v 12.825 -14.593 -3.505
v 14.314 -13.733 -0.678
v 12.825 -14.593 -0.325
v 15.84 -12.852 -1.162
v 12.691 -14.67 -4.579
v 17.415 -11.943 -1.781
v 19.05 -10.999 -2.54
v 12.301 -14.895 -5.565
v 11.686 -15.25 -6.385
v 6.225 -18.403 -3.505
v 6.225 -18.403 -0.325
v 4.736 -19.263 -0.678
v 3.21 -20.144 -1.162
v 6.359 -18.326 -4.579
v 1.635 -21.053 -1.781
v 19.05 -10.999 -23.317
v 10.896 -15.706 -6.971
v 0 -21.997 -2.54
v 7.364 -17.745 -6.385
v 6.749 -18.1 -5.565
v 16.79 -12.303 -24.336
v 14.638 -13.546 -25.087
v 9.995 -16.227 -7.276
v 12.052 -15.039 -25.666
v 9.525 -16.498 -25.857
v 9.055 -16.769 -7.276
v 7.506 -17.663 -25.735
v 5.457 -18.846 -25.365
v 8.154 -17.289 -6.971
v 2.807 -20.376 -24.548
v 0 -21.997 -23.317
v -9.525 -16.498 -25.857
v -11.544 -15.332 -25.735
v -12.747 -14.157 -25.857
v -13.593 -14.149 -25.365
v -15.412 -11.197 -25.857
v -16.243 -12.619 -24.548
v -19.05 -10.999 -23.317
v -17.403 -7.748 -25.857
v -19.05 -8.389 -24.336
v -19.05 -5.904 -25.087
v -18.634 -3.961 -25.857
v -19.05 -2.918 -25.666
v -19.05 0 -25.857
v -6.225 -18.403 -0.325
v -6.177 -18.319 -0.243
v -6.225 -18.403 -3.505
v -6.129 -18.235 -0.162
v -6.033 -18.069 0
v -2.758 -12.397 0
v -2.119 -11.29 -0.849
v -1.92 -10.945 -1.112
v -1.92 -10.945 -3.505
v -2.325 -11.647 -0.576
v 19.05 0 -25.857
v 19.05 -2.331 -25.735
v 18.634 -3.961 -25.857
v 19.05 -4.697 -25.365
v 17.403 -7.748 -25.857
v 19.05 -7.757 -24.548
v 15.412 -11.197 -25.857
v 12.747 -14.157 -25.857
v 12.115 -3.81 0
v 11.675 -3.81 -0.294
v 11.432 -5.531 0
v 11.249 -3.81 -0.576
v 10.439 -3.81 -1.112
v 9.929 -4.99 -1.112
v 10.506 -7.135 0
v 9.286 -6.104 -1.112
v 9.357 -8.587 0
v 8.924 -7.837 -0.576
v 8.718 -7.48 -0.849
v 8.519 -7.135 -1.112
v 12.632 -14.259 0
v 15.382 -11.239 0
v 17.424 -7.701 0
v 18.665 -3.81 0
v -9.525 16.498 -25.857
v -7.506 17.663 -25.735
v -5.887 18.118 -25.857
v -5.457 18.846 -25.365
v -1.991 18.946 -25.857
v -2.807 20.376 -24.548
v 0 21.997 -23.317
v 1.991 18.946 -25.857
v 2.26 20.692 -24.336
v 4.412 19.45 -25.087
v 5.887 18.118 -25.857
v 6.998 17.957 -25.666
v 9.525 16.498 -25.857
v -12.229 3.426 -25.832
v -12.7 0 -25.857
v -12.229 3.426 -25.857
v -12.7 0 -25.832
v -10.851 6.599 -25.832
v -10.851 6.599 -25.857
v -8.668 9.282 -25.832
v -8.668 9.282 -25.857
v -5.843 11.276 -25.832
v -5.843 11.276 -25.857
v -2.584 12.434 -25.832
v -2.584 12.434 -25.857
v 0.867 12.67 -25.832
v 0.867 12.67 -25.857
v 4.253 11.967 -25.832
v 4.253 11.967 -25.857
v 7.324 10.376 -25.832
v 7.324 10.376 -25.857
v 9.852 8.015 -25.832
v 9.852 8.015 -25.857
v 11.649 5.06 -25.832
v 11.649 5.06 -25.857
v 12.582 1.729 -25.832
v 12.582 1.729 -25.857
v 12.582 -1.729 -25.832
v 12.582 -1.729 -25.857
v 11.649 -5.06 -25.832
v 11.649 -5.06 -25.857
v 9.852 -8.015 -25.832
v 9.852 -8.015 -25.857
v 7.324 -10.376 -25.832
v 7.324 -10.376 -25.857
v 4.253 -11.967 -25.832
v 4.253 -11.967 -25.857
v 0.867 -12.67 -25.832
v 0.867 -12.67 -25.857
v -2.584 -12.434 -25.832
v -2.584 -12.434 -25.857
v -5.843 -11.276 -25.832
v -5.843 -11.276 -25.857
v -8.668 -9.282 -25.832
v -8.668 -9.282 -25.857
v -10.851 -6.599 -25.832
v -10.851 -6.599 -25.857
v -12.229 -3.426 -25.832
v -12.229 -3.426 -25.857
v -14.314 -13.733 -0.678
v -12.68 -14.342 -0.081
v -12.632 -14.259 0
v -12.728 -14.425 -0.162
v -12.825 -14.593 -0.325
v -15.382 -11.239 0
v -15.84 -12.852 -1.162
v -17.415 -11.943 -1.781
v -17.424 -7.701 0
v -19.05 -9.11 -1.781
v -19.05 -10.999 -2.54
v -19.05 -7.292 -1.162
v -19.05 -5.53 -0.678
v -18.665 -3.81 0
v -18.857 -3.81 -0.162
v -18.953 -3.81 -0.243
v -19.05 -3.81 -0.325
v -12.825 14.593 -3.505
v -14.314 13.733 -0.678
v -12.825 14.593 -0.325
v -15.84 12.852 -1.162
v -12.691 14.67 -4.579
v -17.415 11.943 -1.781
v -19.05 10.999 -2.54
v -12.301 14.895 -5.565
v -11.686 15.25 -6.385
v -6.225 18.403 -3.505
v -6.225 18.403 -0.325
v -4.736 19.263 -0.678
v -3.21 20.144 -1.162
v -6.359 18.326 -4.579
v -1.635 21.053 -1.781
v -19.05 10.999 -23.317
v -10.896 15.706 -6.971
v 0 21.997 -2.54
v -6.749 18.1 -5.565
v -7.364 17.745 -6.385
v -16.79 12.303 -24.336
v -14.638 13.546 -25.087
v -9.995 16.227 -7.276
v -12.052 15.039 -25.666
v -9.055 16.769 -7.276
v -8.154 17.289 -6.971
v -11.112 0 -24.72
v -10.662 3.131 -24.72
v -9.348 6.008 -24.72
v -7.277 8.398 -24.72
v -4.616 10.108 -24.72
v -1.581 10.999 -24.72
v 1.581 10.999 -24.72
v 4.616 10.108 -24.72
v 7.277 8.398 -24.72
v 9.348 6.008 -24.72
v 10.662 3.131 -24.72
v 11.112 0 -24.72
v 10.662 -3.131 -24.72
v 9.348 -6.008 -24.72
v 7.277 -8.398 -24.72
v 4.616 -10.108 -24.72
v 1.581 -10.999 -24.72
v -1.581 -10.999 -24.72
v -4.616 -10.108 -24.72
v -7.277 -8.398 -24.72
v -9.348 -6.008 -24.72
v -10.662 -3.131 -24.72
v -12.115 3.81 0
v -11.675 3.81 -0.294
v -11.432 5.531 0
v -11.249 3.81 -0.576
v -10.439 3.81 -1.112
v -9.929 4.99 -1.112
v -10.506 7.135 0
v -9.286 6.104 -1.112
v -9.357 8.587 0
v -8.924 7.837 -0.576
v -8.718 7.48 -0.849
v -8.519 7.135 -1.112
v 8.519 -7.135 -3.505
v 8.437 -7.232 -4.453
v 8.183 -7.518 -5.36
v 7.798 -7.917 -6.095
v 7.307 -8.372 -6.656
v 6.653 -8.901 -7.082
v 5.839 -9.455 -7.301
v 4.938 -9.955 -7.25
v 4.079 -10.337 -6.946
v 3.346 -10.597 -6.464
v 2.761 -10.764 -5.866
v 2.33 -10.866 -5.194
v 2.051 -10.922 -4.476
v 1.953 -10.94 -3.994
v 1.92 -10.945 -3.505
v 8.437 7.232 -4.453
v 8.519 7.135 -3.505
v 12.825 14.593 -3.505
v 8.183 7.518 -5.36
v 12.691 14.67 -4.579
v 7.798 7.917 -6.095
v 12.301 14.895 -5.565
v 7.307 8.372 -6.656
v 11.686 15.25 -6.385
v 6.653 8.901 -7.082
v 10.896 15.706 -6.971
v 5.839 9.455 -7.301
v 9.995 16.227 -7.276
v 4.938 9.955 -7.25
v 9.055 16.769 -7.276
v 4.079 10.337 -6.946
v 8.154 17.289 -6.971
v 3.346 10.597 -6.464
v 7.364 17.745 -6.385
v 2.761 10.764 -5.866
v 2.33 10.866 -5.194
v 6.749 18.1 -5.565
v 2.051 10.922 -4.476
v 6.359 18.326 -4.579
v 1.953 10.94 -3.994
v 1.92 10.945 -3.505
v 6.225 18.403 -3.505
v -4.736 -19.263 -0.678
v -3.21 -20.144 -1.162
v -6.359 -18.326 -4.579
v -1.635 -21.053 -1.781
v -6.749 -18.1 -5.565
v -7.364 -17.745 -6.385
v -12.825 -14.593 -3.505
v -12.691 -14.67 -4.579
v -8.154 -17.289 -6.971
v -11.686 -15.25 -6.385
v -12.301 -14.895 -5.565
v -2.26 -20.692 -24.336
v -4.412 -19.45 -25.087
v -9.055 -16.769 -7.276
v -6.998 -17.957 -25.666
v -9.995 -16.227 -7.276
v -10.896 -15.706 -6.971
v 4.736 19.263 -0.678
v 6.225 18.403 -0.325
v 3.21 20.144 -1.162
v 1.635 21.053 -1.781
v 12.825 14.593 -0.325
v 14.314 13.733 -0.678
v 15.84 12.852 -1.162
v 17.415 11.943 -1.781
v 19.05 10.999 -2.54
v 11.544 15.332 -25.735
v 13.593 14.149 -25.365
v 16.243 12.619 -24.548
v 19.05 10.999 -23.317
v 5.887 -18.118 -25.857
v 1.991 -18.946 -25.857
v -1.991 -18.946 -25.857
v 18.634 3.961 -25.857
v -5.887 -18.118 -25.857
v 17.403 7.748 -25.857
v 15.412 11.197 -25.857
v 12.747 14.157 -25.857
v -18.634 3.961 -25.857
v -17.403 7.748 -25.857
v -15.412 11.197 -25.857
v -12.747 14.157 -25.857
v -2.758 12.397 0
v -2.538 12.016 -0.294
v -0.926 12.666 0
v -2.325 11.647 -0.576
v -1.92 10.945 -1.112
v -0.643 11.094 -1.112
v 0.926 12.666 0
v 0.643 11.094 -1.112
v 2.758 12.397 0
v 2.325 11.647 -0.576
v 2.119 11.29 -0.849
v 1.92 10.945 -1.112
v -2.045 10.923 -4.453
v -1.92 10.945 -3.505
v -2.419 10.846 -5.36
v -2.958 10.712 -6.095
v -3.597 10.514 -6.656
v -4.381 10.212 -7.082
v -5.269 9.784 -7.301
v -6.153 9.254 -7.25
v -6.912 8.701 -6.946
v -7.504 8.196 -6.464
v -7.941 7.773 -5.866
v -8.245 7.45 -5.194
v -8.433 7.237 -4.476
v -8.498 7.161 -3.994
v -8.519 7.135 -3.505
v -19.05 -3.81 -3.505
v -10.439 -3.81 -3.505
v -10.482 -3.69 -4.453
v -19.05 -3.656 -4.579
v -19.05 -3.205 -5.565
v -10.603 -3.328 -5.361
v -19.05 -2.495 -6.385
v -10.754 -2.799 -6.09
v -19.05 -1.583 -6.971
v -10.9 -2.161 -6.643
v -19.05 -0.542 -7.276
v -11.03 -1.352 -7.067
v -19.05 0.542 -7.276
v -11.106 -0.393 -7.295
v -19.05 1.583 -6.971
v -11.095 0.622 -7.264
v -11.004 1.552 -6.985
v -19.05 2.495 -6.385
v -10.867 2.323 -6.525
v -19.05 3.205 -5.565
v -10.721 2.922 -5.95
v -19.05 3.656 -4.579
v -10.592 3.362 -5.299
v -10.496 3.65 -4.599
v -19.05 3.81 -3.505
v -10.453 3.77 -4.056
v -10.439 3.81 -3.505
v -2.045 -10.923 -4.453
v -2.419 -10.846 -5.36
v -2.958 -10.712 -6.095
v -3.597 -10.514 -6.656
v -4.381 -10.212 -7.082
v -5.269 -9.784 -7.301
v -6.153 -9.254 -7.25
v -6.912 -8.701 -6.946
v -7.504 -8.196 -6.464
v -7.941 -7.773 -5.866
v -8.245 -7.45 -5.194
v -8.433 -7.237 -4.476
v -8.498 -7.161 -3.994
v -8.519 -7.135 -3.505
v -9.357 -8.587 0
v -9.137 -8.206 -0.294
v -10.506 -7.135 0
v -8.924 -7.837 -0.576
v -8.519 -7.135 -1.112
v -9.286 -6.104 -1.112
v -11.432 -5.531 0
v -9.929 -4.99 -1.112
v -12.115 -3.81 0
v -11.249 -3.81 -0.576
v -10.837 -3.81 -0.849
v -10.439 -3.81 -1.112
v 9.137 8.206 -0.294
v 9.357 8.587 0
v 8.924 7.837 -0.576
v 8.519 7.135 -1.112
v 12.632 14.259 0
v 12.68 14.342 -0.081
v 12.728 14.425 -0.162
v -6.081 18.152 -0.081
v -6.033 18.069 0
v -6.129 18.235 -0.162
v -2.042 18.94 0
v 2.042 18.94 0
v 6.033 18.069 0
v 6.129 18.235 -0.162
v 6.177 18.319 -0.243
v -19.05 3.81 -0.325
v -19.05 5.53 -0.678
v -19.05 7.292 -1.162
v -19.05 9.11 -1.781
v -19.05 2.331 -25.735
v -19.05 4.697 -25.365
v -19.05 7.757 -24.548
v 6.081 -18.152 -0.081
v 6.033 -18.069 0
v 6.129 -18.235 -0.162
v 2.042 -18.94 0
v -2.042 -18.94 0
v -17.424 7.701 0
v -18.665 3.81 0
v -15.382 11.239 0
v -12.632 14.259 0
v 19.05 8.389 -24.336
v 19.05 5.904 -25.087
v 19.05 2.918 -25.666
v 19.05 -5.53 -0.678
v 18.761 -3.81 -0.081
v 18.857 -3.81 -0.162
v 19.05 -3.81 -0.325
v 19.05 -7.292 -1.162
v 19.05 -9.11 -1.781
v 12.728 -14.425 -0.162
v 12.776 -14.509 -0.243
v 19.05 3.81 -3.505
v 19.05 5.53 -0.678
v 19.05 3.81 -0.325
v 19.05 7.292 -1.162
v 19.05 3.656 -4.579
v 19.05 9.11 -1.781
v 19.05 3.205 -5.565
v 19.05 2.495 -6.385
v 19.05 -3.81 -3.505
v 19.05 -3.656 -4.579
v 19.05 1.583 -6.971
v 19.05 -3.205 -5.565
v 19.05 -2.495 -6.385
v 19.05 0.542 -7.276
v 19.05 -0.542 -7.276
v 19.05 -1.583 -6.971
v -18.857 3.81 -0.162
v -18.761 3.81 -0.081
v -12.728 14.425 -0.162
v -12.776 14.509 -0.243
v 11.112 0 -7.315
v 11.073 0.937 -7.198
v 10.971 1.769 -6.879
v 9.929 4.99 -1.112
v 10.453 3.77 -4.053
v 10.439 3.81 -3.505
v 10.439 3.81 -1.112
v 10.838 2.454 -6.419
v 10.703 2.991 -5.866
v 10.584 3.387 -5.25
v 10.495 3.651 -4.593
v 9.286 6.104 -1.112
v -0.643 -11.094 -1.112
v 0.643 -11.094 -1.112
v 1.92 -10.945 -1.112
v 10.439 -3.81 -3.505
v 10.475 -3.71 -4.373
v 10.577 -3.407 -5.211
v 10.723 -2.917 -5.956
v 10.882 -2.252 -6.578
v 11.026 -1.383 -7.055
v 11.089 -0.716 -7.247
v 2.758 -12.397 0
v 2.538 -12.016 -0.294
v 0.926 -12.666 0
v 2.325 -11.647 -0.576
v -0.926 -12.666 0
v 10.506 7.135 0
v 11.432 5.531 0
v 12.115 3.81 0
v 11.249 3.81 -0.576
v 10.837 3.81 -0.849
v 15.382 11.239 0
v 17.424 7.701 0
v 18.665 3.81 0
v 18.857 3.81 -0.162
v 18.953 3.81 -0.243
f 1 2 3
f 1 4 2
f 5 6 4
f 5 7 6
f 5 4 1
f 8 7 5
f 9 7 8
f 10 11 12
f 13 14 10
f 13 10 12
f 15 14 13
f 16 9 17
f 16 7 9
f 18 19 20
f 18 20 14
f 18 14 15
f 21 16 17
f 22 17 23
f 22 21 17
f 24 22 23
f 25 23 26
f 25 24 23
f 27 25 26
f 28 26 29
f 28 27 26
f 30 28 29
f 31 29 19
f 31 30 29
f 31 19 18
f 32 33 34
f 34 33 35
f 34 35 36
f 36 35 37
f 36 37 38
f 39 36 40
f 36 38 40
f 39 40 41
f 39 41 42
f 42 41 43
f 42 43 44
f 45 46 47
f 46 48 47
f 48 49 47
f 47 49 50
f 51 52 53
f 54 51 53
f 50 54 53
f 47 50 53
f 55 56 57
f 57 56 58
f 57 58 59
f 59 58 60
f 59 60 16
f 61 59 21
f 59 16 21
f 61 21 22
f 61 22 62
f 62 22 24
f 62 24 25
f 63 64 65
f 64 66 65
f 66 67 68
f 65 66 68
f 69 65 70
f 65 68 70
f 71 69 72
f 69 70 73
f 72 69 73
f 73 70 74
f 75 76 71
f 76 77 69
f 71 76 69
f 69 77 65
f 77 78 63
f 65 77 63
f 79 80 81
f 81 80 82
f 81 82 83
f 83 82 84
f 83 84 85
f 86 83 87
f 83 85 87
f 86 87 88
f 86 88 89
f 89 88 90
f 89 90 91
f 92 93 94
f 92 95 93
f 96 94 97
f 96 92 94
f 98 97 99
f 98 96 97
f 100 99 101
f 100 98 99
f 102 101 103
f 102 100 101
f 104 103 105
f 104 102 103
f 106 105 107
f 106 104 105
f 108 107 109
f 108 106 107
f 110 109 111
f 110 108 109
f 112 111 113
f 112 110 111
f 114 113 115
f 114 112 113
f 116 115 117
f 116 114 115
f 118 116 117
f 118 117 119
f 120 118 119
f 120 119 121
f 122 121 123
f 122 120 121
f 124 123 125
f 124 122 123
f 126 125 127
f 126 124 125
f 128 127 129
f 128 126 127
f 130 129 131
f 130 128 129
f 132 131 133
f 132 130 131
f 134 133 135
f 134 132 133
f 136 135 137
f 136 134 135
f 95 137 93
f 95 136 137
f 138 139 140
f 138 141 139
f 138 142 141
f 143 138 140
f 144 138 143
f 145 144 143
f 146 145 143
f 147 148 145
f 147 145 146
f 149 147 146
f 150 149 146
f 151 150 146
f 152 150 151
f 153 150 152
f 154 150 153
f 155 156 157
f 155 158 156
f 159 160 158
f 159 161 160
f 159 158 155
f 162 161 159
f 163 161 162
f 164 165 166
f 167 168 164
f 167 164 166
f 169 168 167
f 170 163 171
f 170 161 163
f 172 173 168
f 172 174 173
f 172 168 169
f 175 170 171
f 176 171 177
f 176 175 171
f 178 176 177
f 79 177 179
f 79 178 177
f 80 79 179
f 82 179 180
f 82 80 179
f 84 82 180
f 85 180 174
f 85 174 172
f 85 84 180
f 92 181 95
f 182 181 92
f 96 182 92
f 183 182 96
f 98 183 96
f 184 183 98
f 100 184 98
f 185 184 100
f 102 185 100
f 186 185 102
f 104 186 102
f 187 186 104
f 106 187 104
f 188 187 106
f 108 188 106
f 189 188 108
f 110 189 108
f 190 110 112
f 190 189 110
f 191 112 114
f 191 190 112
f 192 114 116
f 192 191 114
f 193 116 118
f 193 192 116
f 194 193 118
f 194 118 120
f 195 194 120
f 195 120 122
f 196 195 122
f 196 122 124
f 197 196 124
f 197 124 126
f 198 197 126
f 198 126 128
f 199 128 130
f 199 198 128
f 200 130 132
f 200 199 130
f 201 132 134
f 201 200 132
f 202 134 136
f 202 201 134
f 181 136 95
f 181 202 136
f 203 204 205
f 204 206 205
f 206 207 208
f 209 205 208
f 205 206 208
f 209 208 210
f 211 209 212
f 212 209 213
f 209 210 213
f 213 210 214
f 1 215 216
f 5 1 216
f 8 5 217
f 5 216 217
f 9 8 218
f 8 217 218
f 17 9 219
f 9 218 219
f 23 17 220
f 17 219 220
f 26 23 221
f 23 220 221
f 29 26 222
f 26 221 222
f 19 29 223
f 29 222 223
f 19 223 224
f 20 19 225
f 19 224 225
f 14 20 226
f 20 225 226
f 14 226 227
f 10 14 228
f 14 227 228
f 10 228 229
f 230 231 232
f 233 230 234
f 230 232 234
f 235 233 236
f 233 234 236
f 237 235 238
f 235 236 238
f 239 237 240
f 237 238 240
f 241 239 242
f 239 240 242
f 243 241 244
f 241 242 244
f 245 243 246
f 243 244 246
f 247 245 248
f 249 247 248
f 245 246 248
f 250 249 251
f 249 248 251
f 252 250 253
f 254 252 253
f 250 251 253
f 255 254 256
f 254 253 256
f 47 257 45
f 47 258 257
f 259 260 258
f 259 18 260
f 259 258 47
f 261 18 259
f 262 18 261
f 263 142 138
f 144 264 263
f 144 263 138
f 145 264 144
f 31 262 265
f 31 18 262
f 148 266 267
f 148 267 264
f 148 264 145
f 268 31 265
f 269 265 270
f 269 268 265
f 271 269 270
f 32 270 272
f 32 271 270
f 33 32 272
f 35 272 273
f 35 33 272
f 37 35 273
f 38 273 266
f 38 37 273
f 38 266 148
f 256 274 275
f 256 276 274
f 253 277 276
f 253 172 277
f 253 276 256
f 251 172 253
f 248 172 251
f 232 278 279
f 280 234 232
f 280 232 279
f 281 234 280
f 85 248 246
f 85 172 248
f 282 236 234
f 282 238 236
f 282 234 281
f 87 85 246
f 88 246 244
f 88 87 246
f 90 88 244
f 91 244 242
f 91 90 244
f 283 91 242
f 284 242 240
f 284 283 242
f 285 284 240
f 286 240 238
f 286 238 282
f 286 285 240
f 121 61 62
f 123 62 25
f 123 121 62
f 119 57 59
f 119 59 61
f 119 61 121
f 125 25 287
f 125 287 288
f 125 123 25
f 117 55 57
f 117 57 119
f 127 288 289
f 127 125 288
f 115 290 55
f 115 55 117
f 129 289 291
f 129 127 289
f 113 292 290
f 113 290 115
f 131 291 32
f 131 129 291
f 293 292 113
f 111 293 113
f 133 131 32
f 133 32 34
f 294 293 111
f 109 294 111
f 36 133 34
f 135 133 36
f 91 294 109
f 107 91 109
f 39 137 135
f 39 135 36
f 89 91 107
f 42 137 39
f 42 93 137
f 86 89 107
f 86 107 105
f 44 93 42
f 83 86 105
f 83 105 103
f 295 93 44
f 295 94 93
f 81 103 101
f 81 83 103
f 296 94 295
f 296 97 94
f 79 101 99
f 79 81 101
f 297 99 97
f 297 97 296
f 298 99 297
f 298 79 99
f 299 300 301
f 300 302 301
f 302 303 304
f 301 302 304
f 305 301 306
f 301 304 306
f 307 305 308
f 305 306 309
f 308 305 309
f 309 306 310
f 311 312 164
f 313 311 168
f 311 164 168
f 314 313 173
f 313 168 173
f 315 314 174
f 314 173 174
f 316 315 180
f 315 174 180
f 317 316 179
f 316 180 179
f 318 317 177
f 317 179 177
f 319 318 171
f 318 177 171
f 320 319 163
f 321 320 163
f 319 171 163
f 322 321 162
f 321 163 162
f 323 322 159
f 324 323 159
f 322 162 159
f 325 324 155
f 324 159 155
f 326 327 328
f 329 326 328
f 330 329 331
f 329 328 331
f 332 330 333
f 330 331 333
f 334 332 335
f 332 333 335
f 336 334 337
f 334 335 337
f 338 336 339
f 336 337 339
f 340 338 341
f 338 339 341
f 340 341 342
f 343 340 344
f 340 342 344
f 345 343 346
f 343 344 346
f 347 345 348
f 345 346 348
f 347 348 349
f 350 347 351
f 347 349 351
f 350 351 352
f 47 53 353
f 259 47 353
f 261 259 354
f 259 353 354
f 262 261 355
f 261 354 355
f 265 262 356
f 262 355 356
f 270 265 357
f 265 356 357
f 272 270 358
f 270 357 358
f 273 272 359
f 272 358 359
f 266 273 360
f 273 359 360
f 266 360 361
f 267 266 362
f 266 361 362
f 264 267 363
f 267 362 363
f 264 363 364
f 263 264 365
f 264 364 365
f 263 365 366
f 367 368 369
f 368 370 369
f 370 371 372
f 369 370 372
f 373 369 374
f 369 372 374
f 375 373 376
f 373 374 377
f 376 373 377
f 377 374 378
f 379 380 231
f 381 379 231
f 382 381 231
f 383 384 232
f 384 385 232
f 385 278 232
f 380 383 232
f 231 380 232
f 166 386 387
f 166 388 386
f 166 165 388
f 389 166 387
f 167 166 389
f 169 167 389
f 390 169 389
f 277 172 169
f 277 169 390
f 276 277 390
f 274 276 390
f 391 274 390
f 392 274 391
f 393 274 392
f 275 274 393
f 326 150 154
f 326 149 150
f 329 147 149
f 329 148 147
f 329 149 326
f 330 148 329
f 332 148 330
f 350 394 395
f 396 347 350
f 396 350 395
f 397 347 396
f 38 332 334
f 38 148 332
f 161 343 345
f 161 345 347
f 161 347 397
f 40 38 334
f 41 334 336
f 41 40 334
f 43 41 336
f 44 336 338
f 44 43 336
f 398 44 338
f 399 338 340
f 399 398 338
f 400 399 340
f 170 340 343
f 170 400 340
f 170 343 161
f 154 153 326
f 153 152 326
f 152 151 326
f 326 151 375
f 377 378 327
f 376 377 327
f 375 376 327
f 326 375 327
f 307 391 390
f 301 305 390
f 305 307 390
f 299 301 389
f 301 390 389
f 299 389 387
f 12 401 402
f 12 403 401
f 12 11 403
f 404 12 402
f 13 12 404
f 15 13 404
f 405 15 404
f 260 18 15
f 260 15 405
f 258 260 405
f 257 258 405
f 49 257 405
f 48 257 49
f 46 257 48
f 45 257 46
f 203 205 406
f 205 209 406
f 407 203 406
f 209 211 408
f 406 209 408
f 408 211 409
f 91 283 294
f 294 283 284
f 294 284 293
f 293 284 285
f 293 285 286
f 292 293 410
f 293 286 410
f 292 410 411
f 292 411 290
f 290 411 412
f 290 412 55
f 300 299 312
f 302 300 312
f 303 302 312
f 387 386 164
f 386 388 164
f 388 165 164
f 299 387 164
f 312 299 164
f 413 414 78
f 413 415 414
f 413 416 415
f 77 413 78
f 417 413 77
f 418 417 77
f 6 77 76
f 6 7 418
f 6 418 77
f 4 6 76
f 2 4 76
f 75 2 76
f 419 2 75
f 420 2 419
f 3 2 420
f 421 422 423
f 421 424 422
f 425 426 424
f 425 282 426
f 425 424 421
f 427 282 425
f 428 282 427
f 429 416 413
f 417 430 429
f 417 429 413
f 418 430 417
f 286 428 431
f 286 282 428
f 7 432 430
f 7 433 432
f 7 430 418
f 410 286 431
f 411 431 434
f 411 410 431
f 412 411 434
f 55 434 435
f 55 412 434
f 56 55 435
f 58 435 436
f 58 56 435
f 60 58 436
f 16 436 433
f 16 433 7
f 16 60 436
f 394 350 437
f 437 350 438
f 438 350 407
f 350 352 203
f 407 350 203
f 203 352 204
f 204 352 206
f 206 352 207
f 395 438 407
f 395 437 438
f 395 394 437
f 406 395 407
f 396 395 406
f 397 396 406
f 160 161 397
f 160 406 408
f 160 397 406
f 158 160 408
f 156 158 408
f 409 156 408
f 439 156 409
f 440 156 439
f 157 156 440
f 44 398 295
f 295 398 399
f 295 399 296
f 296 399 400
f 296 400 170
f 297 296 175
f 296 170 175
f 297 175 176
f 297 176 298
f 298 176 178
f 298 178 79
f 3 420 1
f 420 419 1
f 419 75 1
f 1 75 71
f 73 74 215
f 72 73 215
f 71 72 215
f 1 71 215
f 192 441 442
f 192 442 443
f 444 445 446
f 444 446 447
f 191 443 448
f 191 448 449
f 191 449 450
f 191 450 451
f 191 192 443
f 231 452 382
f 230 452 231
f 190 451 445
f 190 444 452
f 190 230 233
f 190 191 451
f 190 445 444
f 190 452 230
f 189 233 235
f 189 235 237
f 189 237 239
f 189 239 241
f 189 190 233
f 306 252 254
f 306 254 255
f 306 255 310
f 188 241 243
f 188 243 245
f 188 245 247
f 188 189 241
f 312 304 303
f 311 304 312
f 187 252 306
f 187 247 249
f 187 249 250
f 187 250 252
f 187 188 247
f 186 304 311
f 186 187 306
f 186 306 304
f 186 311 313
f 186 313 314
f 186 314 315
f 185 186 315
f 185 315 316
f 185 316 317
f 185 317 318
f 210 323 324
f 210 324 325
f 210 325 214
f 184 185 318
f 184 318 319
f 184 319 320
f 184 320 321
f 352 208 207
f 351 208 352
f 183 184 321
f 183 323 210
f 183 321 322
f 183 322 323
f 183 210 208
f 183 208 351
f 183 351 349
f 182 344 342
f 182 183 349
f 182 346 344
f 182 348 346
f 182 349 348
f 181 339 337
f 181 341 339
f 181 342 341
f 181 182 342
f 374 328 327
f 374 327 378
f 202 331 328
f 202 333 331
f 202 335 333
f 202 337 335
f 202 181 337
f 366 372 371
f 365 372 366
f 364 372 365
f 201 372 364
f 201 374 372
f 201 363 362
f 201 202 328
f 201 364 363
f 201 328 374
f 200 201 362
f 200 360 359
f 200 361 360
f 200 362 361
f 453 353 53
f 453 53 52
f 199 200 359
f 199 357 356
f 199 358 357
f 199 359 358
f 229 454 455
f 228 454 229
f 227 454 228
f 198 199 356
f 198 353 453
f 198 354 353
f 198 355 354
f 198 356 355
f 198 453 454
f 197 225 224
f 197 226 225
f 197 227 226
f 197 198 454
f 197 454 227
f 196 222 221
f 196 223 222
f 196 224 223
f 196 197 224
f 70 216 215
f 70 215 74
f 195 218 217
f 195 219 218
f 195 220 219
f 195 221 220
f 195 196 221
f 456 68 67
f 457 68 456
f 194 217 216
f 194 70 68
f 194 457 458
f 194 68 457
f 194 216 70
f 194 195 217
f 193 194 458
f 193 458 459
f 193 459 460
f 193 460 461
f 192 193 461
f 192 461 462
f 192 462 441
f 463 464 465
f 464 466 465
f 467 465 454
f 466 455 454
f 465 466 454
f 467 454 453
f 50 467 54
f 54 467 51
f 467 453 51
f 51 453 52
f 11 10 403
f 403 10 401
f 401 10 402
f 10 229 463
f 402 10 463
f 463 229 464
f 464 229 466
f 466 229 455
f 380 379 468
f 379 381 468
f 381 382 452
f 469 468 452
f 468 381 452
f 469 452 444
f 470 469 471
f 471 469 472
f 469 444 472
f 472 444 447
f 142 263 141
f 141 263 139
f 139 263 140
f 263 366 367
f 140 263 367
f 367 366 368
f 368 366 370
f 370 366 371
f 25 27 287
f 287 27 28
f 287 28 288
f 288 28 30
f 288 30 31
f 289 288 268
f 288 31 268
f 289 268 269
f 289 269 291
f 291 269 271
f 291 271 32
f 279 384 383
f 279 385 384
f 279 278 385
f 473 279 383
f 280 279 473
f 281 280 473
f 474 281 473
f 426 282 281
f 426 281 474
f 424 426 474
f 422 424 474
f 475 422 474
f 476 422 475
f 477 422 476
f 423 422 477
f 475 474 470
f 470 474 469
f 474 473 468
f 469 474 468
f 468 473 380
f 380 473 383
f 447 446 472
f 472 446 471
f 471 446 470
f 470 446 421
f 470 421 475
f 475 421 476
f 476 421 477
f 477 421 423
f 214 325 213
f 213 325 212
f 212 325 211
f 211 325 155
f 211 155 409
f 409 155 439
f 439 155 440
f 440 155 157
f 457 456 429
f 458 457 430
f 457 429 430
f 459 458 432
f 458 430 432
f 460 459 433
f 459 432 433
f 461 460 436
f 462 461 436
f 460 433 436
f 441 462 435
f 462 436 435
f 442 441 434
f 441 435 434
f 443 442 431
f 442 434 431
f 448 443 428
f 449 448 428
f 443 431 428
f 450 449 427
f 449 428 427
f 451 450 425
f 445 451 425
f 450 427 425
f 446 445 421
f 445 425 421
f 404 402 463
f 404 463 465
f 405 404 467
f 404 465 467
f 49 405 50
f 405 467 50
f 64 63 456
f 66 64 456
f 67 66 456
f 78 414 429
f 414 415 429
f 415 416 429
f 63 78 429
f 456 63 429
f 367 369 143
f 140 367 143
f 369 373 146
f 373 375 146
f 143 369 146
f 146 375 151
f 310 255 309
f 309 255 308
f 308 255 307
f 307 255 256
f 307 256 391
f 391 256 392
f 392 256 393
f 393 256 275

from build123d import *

# Parameters (mm, degrees)
BASENUT_START     = -25.8572
BASENUTSKE_R      = 11.1125
BASENUT_DEPTH     = 25.8572
SLOT_DEPTH        = 52.030136114
SLOTPATTERN_COUNT = 3
SLOTPATTERN_ANGLE = 120


with BuildPart() as part:
    # BaseNutSke → BaseNut (new body)
    with BuildSketch(Plane.XY.offset(BASENUT_START)):
        Polygon((19.05, 10.998522628), (19.05, -10.998522628), (0, -21.997045256), (-19.05, -10.998522628), (-19.05, 10.998522628), (0, 21.997045256), align=None)
        Circle(BASENUTSKE_R, mode=Mode.SUBTRACT)
    extrude(amount=BASENUT_DEPTH)

    # Sketch4 → Slot (cut, through all)
    with BuildSketch(Plane(origin=(19.05, 0, 0), x_dir=(0, 0, -1), z_dir=(1, 0, 0))):
        with BuildLine():
            Line((3.5052, 3.81), (0, 3.81))
            Line((0, 3.81), (0, -3.81))
            Line((0, -3.81), (3.5052, -3.81))
            ThreePointArc((3.5052, -3.81), (7.3152, 0), (3.5052, 3.81))
        make_face()
    slot = extrude(amount=-SLOT_DEPTH, mode=Mode.SUBTRACT)

    # SlotPattern: Slot ×3 about axis
    slotpattern_axis = Axis((0, 0, 0), (0, 0, 1))
    for i in range(1, SLOTPATTERN_COUNT):
        add(slot.rotate(slotpattern_axis, i * SLOTPATTERN_ANGLE / (SLOTPATTERN_COUNT - 1)), mode=Mode.SUBTRACT)

    # Sketch3 → Double-Chamfer (revolve, cut)
    with BuildSketch(Plane(origin=(0, 0, 0), x_dir=(0, 0, -1), z_dir=(1, 0, 0)), mode=Mode.PRIVATE) as double_chamfer_sk:
        Polygon((25.8572, 19.05), (23.3172, 21.997045256), (23.3172, 34.697045256), (38.5572, 34.697045256), (38.5572, 19.05), align=None)
        Polygon((2.54, 21.997045256), (2.54, 34.697045256), (-12.7, 34.697045256), (-12.7, 19.05), (0, 19.05), align=None)
    revolve(double_chamfer_sk.sketch.rotate(Axis((0, 0, 0), (0, 0, -1)), 90), axis=Axis((0, 0, 0), (0, 0, -1)), mode=Mode.SUBTRACT)

    # EndChamferSketch → EndChamfer (revolve, cut)
    with BuildSketch(Plane(origin=(0, 0, 0), x_dir=(0, 0, -1), z_dir=(1, 0, 0)), mode=Mode.PRIVATE) as endchamfer_sk:
        Polygon((25.8318, 12.7), (24.609062586, 10.95375), (25.8826, 10.95375), (25.8826, 12.7), align=None)
        Polygon((-0.0508, 12.7), (0, 12.7), (1.222737414, 10.95375), (-0.0508, 10.95375), align=None)
    revolve(endchamfer_sk.sketch.rotate(Axis((0, 0, -25.037505729), (0, 0, -1)), 270), axis=Axis((0, 0, -25.037505729), (0, 0, -1)), mode=Mode.SUBTRACT)


solid = part.part
